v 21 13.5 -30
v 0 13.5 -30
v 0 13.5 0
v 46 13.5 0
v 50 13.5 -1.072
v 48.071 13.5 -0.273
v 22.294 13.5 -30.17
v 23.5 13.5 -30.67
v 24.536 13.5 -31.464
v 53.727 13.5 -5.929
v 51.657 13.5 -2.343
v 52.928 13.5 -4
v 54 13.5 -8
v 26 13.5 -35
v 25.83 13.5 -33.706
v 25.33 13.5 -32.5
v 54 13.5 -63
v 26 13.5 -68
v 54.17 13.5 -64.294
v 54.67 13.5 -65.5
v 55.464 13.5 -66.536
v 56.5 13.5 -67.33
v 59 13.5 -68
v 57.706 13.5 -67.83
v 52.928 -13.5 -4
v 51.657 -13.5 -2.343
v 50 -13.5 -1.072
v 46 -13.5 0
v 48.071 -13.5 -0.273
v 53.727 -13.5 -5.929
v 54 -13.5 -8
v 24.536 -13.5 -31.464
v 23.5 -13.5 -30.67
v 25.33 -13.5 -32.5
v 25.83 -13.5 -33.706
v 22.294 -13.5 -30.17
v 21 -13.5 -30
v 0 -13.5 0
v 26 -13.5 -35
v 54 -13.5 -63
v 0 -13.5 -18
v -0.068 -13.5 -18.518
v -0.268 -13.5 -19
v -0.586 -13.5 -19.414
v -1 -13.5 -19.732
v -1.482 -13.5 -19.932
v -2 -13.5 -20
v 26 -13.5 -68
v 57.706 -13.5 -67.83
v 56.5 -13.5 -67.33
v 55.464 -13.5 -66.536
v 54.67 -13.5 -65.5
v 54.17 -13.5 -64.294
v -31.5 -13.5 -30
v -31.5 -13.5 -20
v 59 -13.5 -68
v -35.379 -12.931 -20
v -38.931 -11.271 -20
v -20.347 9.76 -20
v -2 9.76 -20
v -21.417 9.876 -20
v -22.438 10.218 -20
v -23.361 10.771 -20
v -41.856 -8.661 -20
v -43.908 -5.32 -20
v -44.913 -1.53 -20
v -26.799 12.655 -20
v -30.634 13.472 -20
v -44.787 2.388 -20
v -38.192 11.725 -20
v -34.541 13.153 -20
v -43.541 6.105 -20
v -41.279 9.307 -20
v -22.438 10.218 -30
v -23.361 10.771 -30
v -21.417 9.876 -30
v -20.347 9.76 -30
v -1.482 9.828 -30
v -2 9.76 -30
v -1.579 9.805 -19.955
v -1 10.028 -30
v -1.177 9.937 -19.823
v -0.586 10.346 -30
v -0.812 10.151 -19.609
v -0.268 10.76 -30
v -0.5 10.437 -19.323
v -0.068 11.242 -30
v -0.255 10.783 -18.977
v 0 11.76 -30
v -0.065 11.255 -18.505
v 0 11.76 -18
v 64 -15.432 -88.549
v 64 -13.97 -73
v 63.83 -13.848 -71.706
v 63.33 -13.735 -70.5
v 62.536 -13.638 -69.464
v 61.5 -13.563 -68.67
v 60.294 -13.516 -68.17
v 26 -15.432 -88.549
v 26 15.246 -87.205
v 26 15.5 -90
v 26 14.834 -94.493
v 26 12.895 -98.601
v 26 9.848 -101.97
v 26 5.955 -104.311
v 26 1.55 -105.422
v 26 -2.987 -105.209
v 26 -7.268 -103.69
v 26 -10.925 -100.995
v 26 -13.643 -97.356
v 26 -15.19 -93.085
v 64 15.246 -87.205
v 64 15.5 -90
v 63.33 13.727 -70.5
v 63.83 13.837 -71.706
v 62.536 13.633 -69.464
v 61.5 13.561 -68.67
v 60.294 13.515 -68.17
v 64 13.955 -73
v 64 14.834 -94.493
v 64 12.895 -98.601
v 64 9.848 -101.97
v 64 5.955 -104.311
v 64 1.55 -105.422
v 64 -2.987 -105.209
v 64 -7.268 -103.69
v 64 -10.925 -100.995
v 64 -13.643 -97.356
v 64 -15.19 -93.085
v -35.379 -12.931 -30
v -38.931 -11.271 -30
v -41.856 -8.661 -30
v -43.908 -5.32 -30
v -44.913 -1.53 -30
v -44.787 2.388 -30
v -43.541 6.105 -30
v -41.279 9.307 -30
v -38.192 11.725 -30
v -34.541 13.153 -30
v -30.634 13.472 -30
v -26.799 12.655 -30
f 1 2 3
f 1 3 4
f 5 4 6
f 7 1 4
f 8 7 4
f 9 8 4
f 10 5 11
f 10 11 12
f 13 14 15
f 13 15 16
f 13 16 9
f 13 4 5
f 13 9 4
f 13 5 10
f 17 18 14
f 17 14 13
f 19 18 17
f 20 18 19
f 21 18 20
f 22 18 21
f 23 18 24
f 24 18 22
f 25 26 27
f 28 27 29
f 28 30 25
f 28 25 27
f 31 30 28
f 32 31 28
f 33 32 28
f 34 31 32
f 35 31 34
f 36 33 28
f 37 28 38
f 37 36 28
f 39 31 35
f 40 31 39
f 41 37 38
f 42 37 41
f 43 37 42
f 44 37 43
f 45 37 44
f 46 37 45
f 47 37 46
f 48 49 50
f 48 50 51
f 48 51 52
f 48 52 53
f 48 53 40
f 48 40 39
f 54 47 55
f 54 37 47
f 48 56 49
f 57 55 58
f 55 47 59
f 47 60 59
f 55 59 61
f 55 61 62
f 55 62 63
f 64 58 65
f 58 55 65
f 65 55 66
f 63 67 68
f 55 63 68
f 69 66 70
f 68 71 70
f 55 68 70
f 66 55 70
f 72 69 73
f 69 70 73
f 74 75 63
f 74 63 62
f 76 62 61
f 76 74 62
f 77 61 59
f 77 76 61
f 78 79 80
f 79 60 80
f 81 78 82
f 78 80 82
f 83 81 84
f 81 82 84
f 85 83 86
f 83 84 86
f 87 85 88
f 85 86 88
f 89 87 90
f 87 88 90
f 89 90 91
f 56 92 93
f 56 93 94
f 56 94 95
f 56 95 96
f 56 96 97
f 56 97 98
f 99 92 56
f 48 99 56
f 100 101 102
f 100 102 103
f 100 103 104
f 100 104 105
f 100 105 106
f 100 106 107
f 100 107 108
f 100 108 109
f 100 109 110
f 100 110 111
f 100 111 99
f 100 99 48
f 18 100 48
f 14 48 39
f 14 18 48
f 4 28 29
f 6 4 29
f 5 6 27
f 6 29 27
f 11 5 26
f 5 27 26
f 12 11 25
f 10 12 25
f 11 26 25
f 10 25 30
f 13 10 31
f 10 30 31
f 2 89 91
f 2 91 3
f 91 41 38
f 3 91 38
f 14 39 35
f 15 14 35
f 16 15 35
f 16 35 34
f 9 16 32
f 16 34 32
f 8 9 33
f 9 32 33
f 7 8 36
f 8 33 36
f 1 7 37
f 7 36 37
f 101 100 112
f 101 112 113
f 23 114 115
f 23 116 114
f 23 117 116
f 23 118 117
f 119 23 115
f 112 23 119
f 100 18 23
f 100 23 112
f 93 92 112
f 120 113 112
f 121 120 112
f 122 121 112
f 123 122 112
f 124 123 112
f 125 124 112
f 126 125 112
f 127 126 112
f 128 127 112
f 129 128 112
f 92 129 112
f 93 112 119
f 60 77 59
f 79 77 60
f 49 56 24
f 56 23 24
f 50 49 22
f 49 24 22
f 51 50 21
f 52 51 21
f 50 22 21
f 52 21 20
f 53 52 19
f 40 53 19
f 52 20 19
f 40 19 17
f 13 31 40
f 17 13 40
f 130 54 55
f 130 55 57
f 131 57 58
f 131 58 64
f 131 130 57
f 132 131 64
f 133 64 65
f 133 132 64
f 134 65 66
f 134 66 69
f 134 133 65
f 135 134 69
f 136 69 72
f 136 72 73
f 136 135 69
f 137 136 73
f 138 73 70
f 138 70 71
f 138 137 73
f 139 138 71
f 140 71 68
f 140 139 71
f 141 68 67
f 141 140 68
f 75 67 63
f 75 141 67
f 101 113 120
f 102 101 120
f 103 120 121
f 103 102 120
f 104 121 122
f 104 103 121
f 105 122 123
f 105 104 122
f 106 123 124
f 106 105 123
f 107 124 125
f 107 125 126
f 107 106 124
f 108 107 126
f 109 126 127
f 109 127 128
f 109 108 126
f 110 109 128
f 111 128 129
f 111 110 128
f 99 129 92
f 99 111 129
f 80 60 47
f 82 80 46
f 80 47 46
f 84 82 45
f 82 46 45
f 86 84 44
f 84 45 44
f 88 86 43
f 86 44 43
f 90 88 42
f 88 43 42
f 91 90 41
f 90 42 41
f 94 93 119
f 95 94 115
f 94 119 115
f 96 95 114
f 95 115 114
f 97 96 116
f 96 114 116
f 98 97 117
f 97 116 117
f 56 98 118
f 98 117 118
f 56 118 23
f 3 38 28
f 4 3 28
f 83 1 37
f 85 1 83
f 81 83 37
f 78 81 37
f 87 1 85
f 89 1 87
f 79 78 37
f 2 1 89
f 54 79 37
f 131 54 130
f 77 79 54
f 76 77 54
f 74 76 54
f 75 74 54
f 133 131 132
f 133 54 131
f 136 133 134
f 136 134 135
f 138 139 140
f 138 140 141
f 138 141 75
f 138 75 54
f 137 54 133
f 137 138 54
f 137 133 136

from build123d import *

# Parameters (mm, degrees)
BOSS_EXTRUDE1_DEPTH      = 13.5
BOSS_EXTRUDE1_DEPTH_BACK = 13.5
BOSS_EXTRUDE2_START      = -30
BOSS_EXTRUDE2_DEPTH      = 10
FILLET3_R                = 2
BOSS_EXTRUDE3_DEPTH      = 38
FILLET4_R                = 5
FILLET5_R                = 5


with BuildPart() as part:
    # Sketch1 → Boss-Extrude1 (new, two sides: drawn at the far end of the back side and taken through both)
    with BuildSketch(Plane(origin=(0, 0, 0), x_dir=(1, 0, 0), z_dir=(0, 1, 0)).offset(-BOSS_EXTRUDE1_DEPTH_BACK)):
        with BuildLine():
            Line((0, 0), (46, 0))
            ThreePointArc((46, 0), (51.656854249, 2.343145751), (54, 8))
            Line((54, 8), (54, 68))
            Line((54, 68), (26, 68))
            Line((26, 68), (26, 35))
            ThreePointArc((26, 35), (24.535533906, 31.464466094), (21, 30))
            Line((21, 30), (0, 30))
            Line((0, 30), (0, 15))
            Line((0, 15), (0, 0))
        make_face()
    extrude(amount=BOSS_EXTRUDE1_DEPTH + BOSS_EXTRUDE1_DEPTH_BACK)

    # Sketch2 → Boss-Extrude2 (add)
    with BuildSketch(Plane.XY.offset(BOSS_EXTRUDE2_START)):
        with BuildLine():
            Line((0, -13.5), (-31.5, -13.5))
            ThreePointArc((-31.5, -13.5), (-44.299517979, 4.292125289), (-23.361165214, 10.770764519))
            ThreePointArc((-23.361165214, 10.770764519), (-21.936457993, 10.019374349), (-20.346781961, 9.759936564))
            Line((-20.346781961, 9.759936564), (0, 9.759936564))
            Line((0, 9.759936564), (0, -13.5))
        make_face()
    extrude(amount=BOSS_EXTRUDE2_DEPTH)

    # Fillet3
    fillet3_edges = [part.edges().sort_by_distance(p)[0] for p in [
        (0, 9.759936564, -25),
        (0, -1.870031718, -20),
    ]]
    fillet(fillet3_edges, radius=FILLET3_R)

    # Sketch4 → Boss-Extrude3 (add)
    with BuildSketch(Plane.ZY.offset(-26)):
        with BuildLine():
            ThreePointArc((-90, 15.5), (-105.482977781, -0.726222431), (-88.549150224, -15.431948514))
            Line((-88.549150224, -15.431948514), (-68, -13.5))
            Line((-68, -13.5), (-68, 13.5))
            Line((-68, 13.5), (-87.204918033, 15.245901639))
            Line((-87.204918033, 15.245901639), (-90, 15.5))
        make_face()
    extrude(amount=-BOSS_EXTRUDE3_DEPTH)

    # Fillet4
    fillet4_edges = [part.edges().sort_by_distance(p)[0] for p in [
        (54, 0, -68),
    ]]
    fillet(fillet4_edges, radius=FILLET4_R)

    # Fillet5
    fillet5_edges = [part.edges().sort_by_distance(p)[0] for p in [
        (64, 0, -68),
    ]]
    fillet(fillet5_edges, radius=FILLET5_R - 0.0001)  # a hair under: the kernel refuses the full size


solid = part.part
